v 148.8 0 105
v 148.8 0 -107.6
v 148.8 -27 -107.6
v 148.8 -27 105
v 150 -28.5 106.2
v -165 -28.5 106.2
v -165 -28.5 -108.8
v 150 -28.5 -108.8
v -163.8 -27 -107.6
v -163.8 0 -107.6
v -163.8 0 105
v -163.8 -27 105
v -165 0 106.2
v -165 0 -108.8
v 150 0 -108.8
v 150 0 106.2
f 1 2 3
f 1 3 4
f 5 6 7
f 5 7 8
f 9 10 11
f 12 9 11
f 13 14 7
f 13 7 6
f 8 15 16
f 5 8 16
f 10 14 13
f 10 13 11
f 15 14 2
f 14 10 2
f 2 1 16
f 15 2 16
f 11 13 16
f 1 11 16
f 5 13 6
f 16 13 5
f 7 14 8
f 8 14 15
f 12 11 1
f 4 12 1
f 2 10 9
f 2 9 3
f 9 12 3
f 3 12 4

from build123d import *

# Parameters (mm, degrees)
F0_W     = 315
F0_H     = 215
F0_W_2   = 312.6
F0_H_2   = 212.6
F1_DEPTH = 28.5
F2_W     = 312.6
F2_H     = 212.6
F3_DEPTH = 1.5


with BuildPart() as f1:
    # F0 (on Front) → F1 (new body)
    with BuildSketch(Plane.XZ):
        with Locations((-7.5, -1.3)):
            Rectangle(F0_W, F0_H)
        with Locations((-7.5, -1.3)):
            Rectangle(F0_W_2, F0_H_2, mode=Mode.SUBTRACT)
    extrude(amount=F1_DEPTH)

    # F2 (on face) → F3 (join)
    with BuildSketch(Plane.XZ.offset(28.5)):
        with Locations((-7.5, -1.3)):
            Rectangle(F2_W, F2_H)
    extrude(amount=-F3_DEPTH)


solid = f1.part
